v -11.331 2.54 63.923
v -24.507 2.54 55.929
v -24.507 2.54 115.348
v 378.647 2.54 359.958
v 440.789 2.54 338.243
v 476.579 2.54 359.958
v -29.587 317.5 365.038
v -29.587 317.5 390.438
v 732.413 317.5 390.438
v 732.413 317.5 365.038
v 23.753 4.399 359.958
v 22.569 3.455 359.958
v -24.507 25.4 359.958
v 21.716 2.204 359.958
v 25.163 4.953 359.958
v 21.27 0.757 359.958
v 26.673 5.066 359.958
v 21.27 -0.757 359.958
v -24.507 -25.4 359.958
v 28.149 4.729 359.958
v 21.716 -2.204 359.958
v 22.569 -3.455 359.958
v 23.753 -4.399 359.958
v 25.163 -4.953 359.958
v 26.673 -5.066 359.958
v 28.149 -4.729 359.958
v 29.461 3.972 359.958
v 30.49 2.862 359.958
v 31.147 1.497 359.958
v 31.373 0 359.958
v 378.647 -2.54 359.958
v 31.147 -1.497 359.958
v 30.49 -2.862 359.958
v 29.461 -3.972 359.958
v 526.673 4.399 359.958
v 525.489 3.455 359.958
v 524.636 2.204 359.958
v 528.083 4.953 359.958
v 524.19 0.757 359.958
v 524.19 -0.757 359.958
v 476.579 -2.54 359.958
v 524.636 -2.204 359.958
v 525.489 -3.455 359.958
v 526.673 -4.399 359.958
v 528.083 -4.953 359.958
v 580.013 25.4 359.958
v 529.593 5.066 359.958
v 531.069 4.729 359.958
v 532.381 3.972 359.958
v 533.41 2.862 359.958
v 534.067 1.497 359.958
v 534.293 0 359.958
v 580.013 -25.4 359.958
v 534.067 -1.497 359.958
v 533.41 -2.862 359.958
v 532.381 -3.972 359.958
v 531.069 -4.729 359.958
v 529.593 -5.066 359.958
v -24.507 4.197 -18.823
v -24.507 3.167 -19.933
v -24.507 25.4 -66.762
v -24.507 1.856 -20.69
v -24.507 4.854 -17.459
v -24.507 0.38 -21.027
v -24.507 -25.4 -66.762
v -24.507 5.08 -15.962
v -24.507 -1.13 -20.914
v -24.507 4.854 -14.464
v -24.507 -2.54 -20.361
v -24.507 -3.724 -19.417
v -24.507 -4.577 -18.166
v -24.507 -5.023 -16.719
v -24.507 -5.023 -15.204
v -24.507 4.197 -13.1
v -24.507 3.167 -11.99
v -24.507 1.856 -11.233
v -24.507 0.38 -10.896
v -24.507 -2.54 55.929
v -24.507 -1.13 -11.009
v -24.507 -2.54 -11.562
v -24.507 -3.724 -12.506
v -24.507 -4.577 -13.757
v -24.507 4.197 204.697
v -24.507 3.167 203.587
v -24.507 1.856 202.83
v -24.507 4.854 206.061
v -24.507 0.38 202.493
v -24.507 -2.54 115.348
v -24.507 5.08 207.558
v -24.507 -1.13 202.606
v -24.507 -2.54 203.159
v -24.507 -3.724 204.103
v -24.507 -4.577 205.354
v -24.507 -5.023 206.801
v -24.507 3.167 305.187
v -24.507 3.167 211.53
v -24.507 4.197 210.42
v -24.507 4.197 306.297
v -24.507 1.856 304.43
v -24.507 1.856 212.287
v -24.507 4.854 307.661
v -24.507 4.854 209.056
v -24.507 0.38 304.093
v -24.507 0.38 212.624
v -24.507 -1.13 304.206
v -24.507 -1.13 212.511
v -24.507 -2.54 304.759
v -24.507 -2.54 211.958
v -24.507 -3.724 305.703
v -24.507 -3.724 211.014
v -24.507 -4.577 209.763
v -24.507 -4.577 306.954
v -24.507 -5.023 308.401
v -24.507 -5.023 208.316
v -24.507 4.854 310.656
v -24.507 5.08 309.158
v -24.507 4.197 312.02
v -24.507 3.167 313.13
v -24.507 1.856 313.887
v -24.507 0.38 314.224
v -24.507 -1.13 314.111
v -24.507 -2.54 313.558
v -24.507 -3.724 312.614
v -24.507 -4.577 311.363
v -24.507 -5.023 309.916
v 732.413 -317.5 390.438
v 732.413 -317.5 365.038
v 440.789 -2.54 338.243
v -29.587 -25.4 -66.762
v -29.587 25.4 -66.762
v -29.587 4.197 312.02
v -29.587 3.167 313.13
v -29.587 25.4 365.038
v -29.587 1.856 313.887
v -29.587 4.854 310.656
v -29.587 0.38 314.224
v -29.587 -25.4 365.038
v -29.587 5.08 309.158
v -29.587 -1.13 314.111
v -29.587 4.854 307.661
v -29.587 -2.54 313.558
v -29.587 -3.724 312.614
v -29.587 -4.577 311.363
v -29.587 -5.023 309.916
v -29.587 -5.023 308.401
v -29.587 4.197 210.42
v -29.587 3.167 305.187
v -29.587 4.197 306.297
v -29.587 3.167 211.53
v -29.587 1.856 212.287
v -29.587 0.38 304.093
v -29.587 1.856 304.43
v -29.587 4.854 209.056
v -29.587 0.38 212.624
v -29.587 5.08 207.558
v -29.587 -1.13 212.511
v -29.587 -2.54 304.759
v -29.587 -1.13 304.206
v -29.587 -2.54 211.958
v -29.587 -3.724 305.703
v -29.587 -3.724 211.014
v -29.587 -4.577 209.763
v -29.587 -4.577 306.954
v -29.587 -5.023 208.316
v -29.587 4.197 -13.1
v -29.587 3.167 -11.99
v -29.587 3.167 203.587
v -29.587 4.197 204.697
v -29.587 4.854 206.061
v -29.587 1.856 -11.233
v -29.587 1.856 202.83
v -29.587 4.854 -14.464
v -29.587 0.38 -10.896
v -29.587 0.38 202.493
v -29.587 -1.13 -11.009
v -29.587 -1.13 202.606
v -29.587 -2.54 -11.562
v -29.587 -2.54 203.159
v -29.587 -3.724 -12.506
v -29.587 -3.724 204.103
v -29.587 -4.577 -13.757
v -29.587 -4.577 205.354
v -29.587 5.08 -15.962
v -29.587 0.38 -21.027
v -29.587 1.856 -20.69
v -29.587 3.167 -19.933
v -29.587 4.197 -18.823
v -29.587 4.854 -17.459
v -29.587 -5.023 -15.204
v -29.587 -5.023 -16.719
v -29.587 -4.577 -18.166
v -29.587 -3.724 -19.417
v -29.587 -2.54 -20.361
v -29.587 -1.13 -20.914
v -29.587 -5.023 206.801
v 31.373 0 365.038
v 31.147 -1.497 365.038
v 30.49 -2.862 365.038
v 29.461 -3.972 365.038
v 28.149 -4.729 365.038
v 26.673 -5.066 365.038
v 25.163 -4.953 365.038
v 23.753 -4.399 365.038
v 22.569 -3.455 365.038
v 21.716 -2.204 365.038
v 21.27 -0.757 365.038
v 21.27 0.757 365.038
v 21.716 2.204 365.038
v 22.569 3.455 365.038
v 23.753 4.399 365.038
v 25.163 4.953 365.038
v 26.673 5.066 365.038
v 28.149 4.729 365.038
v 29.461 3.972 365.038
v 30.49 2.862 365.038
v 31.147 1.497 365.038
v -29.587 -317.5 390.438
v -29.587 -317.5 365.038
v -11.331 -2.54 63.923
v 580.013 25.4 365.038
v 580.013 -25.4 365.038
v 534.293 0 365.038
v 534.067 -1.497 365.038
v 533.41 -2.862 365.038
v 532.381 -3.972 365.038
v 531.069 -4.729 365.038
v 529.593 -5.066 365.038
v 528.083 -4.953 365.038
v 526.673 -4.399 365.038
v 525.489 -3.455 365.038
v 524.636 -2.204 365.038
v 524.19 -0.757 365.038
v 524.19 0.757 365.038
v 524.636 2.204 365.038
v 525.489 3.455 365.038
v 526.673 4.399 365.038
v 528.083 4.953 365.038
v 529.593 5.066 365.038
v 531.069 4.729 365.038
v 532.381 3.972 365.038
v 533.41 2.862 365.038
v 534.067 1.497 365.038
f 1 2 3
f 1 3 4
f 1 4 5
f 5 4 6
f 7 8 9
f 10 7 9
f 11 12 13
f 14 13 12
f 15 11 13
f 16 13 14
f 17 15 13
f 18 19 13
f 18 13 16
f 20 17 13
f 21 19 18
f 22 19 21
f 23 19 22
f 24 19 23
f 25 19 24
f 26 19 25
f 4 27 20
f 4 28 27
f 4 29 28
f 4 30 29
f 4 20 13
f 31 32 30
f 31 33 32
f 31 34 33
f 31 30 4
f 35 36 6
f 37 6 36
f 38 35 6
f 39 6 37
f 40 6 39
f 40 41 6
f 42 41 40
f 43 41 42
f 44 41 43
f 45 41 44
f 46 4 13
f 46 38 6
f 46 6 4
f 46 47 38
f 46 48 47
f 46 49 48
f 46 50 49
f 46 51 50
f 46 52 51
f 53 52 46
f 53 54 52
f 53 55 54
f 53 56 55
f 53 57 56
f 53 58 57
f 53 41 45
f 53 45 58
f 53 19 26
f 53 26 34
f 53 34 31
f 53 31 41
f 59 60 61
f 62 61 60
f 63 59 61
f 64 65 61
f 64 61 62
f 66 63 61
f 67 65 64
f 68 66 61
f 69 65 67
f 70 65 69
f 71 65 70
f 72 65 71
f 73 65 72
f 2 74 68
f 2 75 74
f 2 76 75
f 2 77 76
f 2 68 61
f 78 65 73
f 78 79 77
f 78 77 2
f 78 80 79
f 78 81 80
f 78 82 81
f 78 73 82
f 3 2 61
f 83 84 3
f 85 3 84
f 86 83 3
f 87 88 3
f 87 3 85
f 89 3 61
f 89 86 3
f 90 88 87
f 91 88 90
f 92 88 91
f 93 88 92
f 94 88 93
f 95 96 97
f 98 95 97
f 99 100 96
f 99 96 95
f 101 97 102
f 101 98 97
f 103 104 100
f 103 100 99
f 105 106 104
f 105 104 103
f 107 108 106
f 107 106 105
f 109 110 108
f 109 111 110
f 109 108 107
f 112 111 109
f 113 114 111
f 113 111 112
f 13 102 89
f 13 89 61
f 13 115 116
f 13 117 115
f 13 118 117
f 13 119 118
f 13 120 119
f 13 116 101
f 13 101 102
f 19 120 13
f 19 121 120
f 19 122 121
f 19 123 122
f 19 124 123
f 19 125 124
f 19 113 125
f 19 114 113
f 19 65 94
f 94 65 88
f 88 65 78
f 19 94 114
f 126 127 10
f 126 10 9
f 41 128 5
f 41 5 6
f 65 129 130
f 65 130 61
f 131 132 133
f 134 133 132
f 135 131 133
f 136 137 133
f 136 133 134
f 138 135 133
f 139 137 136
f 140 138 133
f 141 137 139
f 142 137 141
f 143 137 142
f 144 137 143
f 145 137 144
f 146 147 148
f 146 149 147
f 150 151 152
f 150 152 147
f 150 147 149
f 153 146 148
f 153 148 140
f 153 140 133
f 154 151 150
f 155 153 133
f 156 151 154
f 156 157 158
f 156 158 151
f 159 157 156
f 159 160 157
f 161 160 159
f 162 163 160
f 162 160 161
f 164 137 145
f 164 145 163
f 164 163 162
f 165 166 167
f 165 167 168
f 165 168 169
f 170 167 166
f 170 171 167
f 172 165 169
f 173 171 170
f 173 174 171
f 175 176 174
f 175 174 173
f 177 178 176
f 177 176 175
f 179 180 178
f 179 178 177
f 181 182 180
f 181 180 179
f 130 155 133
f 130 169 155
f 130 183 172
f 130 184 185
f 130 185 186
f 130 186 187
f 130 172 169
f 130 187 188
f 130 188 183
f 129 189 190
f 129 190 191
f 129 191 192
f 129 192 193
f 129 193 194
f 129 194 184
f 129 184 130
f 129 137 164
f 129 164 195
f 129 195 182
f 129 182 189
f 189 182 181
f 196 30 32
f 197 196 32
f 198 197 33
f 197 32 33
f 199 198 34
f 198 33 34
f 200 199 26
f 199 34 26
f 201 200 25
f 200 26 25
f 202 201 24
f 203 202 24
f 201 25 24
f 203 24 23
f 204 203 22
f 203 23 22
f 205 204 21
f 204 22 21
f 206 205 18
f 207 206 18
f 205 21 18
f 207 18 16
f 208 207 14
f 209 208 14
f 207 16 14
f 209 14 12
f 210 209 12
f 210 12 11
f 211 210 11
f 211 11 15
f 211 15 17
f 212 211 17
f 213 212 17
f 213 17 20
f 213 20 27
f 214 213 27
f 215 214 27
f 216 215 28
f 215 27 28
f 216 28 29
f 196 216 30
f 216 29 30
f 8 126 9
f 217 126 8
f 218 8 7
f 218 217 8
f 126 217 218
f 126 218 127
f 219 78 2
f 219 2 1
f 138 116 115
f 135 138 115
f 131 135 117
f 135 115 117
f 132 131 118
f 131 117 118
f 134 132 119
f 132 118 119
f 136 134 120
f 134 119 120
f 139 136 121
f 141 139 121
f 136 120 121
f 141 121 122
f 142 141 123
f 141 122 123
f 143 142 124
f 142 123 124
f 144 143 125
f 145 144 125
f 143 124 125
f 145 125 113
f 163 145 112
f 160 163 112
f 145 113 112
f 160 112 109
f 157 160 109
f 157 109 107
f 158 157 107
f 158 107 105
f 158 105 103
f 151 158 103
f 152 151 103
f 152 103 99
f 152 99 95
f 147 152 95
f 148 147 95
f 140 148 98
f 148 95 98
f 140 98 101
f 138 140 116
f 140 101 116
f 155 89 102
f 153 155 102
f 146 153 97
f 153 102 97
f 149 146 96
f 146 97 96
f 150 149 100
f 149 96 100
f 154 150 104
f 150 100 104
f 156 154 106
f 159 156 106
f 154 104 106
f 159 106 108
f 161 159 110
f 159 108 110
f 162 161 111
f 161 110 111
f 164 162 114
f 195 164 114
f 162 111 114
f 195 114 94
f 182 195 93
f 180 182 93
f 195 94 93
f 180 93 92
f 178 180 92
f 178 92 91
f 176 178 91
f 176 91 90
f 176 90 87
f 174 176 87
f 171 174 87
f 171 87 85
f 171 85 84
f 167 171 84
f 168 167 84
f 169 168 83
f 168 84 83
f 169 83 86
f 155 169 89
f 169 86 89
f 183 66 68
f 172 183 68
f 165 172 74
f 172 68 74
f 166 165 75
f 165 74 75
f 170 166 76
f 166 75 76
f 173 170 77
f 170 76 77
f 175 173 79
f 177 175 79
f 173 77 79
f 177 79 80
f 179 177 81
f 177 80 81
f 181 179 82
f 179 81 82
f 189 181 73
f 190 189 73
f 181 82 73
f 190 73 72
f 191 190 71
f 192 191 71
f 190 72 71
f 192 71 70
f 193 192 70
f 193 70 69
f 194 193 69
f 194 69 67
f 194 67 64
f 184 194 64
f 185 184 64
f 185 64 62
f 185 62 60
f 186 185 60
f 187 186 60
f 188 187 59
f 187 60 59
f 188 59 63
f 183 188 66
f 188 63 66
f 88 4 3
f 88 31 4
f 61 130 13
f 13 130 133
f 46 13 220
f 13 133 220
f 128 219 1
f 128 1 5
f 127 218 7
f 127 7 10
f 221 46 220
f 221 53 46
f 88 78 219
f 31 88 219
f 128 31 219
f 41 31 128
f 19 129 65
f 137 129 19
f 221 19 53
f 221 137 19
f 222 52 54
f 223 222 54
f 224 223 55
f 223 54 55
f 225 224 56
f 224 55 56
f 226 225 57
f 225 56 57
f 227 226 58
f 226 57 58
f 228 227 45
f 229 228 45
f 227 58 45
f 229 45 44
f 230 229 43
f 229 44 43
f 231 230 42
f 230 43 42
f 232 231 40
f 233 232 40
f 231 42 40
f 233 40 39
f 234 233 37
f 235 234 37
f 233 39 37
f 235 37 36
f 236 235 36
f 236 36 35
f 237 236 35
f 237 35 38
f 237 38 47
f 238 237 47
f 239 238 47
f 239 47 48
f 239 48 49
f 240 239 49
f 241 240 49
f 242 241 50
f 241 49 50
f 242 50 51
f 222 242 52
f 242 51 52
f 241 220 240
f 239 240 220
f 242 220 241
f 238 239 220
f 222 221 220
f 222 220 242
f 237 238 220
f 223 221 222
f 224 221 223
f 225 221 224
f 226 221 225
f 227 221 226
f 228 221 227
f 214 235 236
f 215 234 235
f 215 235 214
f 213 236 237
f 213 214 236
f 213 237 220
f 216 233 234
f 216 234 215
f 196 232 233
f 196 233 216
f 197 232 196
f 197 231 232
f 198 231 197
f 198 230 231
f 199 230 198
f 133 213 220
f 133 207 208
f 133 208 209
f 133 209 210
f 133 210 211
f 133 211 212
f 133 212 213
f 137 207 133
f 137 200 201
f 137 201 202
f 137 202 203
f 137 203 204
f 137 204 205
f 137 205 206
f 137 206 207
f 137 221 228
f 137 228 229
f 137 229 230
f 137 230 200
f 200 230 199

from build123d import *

# Parameters (mm, degrees)
F1_DEPTH = 25.4
F2_DEPTH = 2.54
F3_DEPTH = 317.5
F4_R     = 5.08
F6_DEPTH = 5.08
F5_R     = 5.08
F7_DEPTH = 5.08


with BuildPart() as f1:
    # F0 (on Front) → F1 (new body, symmetric)
    with BuildSketch(Plane.XZ):
        Polygon((427.613177, 365.038462), (-29.586823, 365.038462), (-29.586823, 85.638462), (-24.506823, 85.638462), (-24.506823, 115.34816), (-24.506823, 359.958462), (378.647192, 359.958462), (427.613177, 359.958462), align=None)
        Polygon((580.013177, 365.038462), (427.613177, 365.038462), (427.613177, 359.958462), (476.579162, 359.958462), (580.013177, 359.958462), align=None)
        Polygon((-24.506823, 85.638462), (-29.586823, 85.638462), (-29.586823, -66.761538), (-24.506823, -66.761538), (-24.506823, 55.928763), align=None)
    extrude(amount=F1_DEPTH, both=True)

    # F0 (on Front) → F2 (join, symmetric)
    with BuildSketch(Plane.XZ):
        Polygon((-24.506823, 115.34816), (-24.506823, 85.638462), (427.613177, 359.958462), (378.647192, 359.958462), align=None)
        Polygon((427.613177, 359.958462), (-24.506823, 85.638462), (-24.506823, 55.928763), (-11.331146, 63.922994), (440.788854, 338.242994), (476.579162, 359.958462), align=None)
    extrude(amount=F2_DEPTH, both=True)

    # F4 (on face) → F6 (cut)
    with BuildSketch(Plane.YZ.offset(-24.506823)):
        with Locations((0, 309.158462)):
            Circle(F4_R)
        with Locations((0, -15.961538)):
            Circle(F4_R)
        with Locations((0, 207.558462)):
            Circle(F4_R)
    extrude(amount=-F6_DEPTH, mode=Mode.SUBTRACT)

    # F5 (on face) → F7 (cut)
    with BuildSketch(Plane(origin=(0, 0, 359.958462), x_dir=(1, 0, 0), z_dir=(0, 0, -1))):
        with Locations((26.293177, 0)):
            Circle(F5_R)
        with Locations((529.213177, 0)):
            Circle(F5_R)
    extrude(amount=-F7_DEPTH, mode=Mode.SUBTRACT)


with BuildPart() as f3:
    # F0 (on Front) → F3 (new body, symmetric)
    with BuildSketch(Plane.XZ):
        Polygon((-29.586823, 390.438462), (-29.586823, 365.038462), (427.613177, 365.038462), (580.013177, 365.038462), (732.413177, 365.038462), (732.413177, 390.438462), align=None)
    extrude(amount=F3_DEPTH, both=True)


solid = Compound([f1.part, f3.part])
